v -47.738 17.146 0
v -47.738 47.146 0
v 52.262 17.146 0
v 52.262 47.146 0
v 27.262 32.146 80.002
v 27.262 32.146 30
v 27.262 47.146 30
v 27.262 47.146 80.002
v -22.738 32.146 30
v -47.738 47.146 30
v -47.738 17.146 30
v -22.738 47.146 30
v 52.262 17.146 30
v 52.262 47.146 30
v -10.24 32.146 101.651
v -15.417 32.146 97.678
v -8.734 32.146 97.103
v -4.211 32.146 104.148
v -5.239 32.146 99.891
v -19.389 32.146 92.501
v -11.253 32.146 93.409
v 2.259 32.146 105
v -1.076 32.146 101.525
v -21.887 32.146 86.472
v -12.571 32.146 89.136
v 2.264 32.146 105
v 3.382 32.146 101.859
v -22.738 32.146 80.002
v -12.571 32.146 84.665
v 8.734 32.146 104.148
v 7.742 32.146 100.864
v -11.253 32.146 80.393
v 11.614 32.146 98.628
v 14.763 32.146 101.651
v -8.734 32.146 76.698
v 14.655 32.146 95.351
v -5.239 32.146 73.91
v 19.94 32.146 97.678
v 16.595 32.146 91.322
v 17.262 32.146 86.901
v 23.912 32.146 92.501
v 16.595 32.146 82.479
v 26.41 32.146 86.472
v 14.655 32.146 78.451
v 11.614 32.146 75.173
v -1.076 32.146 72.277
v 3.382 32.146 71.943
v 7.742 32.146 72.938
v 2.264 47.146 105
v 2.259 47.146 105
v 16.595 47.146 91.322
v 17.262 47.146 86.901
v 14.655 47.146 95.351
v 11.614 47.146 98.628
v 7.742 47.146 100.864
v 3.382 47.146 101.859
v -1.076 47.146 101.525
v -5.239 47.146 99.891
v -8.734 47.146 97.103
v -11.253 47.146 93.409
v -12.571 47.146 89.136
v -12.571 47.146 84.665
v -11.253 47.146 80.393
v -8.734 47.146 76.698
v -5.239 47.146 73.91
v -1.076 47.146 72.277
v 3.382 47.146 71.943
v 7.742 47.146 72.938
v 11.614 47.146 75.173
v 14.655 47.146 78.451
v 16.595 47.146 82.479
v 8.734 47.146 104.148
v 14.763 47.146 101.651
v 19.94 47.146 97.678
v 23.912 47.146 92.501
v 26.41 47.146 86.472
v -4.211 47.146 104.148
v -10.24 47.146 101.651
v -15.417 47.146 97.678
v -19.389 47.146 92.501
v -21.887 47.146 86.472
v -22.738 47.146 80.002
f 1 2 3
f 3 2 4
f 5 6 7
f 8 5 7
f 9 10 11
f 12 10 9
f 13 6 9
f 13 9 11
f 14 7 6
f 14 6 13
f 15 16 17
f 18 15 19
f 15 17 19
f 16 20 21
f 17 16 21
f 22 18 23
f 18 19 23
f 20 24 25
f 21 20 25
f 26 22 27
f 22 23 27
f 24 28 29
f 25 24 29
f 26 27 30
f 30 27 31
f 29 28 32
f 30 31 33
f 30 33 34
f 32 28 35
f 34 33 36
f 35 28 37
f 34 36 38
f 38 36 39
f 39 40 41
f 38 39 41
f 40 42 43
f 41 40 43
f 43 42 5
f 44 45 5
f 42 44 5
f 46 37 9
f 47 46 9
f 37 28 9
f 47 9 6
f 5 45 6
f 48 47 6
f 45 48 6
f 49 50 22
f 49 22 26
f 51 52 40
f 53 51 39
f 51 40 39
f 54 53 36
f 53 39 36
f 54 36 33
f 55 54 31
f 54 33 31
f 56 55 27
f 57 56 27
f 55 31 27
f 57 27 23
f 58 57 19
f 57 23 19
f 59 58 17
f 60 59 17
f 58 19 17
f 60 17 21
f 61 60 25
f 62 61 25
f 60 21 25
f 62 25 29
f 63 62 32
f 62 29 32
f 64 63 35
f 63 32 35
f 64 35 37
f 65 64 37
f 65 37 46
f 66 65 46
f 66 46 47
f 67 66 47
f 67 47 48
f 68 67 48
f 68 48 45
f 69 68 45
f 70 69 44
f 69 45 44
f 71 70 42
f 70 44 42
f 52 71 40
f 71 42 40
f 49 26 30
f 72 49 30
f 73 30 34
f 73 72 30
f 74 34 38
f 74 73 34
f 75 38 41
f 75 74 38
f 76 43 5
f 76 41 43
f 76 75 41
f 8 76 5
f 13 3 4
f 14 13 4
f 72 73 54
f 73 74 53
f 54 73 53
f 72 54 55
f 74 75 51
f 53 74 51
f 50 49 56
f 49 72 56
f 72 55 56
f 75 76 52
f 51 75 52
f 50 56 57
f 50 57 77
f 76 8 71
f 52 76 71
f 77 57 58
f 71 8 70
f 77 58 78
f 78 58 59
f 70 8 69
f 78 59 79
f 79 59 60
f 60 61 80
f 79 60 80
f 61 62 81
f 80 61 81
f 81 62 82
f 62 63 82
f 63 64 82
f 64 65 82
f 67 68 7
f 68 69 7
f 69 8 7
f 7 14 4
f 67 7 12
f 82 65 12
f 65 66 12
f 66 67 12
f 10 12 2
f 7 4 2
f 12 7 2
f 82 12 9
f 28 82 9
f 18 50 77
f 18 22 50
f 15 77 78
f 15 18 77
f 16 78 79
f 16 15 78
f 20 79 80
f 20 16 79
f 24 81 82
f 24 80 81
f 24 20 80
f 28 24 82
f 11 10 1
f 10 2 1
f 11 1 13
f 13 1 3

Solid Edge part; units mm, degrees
sketch "Sketch1" plane through (0, 0, 0) normal (0, 0, 1) x (1, 0, 0)
  line L0 (-47.7385, 17.1455) -> (52.2615, 17.1455)
  line L1 (52.2615, 17.1455) -> (52.2615, 47.1455)
  line L2 (52.2615, 47.1455) -> (-47.7385, 47.1455)
  line L3 (-47.7385, 47.1455) -> (-47.7385, 17.1455)
extrude "Protrusion1" add sketch "Sketch1" along normal blind 30
sketch "Sketch2" plane through (2.2615, 32.1455, 30) normal (0, 0, 1) x (1, 0, 0)
  line L0 (-25, 15) -> (-25, 0)
  line L1 (-25, 0) -> (25, 0)
  line L2 (25, 0) -> (25, 15)
extrude "ExtrudedProtrusion_2" add sketch "Sketch2" along normal blind 75 material side at (-22.6885, 39.6455, 30)
sketch "Sketch3" plane through (2.2615, 32.1455, 67.5) normal (0, -1, 0) x (1, 0, 0)
  circle A0 centre (0, 19.4008) radius 15
extrude "ExtrudedCutout_1" cut sketch "Sketch3" against normal blind 235.9041
fillet "Round_1" radius 25 2 edges at (27.2615, 39.6455, 105) (-22.7385, 39.6455, 105)
